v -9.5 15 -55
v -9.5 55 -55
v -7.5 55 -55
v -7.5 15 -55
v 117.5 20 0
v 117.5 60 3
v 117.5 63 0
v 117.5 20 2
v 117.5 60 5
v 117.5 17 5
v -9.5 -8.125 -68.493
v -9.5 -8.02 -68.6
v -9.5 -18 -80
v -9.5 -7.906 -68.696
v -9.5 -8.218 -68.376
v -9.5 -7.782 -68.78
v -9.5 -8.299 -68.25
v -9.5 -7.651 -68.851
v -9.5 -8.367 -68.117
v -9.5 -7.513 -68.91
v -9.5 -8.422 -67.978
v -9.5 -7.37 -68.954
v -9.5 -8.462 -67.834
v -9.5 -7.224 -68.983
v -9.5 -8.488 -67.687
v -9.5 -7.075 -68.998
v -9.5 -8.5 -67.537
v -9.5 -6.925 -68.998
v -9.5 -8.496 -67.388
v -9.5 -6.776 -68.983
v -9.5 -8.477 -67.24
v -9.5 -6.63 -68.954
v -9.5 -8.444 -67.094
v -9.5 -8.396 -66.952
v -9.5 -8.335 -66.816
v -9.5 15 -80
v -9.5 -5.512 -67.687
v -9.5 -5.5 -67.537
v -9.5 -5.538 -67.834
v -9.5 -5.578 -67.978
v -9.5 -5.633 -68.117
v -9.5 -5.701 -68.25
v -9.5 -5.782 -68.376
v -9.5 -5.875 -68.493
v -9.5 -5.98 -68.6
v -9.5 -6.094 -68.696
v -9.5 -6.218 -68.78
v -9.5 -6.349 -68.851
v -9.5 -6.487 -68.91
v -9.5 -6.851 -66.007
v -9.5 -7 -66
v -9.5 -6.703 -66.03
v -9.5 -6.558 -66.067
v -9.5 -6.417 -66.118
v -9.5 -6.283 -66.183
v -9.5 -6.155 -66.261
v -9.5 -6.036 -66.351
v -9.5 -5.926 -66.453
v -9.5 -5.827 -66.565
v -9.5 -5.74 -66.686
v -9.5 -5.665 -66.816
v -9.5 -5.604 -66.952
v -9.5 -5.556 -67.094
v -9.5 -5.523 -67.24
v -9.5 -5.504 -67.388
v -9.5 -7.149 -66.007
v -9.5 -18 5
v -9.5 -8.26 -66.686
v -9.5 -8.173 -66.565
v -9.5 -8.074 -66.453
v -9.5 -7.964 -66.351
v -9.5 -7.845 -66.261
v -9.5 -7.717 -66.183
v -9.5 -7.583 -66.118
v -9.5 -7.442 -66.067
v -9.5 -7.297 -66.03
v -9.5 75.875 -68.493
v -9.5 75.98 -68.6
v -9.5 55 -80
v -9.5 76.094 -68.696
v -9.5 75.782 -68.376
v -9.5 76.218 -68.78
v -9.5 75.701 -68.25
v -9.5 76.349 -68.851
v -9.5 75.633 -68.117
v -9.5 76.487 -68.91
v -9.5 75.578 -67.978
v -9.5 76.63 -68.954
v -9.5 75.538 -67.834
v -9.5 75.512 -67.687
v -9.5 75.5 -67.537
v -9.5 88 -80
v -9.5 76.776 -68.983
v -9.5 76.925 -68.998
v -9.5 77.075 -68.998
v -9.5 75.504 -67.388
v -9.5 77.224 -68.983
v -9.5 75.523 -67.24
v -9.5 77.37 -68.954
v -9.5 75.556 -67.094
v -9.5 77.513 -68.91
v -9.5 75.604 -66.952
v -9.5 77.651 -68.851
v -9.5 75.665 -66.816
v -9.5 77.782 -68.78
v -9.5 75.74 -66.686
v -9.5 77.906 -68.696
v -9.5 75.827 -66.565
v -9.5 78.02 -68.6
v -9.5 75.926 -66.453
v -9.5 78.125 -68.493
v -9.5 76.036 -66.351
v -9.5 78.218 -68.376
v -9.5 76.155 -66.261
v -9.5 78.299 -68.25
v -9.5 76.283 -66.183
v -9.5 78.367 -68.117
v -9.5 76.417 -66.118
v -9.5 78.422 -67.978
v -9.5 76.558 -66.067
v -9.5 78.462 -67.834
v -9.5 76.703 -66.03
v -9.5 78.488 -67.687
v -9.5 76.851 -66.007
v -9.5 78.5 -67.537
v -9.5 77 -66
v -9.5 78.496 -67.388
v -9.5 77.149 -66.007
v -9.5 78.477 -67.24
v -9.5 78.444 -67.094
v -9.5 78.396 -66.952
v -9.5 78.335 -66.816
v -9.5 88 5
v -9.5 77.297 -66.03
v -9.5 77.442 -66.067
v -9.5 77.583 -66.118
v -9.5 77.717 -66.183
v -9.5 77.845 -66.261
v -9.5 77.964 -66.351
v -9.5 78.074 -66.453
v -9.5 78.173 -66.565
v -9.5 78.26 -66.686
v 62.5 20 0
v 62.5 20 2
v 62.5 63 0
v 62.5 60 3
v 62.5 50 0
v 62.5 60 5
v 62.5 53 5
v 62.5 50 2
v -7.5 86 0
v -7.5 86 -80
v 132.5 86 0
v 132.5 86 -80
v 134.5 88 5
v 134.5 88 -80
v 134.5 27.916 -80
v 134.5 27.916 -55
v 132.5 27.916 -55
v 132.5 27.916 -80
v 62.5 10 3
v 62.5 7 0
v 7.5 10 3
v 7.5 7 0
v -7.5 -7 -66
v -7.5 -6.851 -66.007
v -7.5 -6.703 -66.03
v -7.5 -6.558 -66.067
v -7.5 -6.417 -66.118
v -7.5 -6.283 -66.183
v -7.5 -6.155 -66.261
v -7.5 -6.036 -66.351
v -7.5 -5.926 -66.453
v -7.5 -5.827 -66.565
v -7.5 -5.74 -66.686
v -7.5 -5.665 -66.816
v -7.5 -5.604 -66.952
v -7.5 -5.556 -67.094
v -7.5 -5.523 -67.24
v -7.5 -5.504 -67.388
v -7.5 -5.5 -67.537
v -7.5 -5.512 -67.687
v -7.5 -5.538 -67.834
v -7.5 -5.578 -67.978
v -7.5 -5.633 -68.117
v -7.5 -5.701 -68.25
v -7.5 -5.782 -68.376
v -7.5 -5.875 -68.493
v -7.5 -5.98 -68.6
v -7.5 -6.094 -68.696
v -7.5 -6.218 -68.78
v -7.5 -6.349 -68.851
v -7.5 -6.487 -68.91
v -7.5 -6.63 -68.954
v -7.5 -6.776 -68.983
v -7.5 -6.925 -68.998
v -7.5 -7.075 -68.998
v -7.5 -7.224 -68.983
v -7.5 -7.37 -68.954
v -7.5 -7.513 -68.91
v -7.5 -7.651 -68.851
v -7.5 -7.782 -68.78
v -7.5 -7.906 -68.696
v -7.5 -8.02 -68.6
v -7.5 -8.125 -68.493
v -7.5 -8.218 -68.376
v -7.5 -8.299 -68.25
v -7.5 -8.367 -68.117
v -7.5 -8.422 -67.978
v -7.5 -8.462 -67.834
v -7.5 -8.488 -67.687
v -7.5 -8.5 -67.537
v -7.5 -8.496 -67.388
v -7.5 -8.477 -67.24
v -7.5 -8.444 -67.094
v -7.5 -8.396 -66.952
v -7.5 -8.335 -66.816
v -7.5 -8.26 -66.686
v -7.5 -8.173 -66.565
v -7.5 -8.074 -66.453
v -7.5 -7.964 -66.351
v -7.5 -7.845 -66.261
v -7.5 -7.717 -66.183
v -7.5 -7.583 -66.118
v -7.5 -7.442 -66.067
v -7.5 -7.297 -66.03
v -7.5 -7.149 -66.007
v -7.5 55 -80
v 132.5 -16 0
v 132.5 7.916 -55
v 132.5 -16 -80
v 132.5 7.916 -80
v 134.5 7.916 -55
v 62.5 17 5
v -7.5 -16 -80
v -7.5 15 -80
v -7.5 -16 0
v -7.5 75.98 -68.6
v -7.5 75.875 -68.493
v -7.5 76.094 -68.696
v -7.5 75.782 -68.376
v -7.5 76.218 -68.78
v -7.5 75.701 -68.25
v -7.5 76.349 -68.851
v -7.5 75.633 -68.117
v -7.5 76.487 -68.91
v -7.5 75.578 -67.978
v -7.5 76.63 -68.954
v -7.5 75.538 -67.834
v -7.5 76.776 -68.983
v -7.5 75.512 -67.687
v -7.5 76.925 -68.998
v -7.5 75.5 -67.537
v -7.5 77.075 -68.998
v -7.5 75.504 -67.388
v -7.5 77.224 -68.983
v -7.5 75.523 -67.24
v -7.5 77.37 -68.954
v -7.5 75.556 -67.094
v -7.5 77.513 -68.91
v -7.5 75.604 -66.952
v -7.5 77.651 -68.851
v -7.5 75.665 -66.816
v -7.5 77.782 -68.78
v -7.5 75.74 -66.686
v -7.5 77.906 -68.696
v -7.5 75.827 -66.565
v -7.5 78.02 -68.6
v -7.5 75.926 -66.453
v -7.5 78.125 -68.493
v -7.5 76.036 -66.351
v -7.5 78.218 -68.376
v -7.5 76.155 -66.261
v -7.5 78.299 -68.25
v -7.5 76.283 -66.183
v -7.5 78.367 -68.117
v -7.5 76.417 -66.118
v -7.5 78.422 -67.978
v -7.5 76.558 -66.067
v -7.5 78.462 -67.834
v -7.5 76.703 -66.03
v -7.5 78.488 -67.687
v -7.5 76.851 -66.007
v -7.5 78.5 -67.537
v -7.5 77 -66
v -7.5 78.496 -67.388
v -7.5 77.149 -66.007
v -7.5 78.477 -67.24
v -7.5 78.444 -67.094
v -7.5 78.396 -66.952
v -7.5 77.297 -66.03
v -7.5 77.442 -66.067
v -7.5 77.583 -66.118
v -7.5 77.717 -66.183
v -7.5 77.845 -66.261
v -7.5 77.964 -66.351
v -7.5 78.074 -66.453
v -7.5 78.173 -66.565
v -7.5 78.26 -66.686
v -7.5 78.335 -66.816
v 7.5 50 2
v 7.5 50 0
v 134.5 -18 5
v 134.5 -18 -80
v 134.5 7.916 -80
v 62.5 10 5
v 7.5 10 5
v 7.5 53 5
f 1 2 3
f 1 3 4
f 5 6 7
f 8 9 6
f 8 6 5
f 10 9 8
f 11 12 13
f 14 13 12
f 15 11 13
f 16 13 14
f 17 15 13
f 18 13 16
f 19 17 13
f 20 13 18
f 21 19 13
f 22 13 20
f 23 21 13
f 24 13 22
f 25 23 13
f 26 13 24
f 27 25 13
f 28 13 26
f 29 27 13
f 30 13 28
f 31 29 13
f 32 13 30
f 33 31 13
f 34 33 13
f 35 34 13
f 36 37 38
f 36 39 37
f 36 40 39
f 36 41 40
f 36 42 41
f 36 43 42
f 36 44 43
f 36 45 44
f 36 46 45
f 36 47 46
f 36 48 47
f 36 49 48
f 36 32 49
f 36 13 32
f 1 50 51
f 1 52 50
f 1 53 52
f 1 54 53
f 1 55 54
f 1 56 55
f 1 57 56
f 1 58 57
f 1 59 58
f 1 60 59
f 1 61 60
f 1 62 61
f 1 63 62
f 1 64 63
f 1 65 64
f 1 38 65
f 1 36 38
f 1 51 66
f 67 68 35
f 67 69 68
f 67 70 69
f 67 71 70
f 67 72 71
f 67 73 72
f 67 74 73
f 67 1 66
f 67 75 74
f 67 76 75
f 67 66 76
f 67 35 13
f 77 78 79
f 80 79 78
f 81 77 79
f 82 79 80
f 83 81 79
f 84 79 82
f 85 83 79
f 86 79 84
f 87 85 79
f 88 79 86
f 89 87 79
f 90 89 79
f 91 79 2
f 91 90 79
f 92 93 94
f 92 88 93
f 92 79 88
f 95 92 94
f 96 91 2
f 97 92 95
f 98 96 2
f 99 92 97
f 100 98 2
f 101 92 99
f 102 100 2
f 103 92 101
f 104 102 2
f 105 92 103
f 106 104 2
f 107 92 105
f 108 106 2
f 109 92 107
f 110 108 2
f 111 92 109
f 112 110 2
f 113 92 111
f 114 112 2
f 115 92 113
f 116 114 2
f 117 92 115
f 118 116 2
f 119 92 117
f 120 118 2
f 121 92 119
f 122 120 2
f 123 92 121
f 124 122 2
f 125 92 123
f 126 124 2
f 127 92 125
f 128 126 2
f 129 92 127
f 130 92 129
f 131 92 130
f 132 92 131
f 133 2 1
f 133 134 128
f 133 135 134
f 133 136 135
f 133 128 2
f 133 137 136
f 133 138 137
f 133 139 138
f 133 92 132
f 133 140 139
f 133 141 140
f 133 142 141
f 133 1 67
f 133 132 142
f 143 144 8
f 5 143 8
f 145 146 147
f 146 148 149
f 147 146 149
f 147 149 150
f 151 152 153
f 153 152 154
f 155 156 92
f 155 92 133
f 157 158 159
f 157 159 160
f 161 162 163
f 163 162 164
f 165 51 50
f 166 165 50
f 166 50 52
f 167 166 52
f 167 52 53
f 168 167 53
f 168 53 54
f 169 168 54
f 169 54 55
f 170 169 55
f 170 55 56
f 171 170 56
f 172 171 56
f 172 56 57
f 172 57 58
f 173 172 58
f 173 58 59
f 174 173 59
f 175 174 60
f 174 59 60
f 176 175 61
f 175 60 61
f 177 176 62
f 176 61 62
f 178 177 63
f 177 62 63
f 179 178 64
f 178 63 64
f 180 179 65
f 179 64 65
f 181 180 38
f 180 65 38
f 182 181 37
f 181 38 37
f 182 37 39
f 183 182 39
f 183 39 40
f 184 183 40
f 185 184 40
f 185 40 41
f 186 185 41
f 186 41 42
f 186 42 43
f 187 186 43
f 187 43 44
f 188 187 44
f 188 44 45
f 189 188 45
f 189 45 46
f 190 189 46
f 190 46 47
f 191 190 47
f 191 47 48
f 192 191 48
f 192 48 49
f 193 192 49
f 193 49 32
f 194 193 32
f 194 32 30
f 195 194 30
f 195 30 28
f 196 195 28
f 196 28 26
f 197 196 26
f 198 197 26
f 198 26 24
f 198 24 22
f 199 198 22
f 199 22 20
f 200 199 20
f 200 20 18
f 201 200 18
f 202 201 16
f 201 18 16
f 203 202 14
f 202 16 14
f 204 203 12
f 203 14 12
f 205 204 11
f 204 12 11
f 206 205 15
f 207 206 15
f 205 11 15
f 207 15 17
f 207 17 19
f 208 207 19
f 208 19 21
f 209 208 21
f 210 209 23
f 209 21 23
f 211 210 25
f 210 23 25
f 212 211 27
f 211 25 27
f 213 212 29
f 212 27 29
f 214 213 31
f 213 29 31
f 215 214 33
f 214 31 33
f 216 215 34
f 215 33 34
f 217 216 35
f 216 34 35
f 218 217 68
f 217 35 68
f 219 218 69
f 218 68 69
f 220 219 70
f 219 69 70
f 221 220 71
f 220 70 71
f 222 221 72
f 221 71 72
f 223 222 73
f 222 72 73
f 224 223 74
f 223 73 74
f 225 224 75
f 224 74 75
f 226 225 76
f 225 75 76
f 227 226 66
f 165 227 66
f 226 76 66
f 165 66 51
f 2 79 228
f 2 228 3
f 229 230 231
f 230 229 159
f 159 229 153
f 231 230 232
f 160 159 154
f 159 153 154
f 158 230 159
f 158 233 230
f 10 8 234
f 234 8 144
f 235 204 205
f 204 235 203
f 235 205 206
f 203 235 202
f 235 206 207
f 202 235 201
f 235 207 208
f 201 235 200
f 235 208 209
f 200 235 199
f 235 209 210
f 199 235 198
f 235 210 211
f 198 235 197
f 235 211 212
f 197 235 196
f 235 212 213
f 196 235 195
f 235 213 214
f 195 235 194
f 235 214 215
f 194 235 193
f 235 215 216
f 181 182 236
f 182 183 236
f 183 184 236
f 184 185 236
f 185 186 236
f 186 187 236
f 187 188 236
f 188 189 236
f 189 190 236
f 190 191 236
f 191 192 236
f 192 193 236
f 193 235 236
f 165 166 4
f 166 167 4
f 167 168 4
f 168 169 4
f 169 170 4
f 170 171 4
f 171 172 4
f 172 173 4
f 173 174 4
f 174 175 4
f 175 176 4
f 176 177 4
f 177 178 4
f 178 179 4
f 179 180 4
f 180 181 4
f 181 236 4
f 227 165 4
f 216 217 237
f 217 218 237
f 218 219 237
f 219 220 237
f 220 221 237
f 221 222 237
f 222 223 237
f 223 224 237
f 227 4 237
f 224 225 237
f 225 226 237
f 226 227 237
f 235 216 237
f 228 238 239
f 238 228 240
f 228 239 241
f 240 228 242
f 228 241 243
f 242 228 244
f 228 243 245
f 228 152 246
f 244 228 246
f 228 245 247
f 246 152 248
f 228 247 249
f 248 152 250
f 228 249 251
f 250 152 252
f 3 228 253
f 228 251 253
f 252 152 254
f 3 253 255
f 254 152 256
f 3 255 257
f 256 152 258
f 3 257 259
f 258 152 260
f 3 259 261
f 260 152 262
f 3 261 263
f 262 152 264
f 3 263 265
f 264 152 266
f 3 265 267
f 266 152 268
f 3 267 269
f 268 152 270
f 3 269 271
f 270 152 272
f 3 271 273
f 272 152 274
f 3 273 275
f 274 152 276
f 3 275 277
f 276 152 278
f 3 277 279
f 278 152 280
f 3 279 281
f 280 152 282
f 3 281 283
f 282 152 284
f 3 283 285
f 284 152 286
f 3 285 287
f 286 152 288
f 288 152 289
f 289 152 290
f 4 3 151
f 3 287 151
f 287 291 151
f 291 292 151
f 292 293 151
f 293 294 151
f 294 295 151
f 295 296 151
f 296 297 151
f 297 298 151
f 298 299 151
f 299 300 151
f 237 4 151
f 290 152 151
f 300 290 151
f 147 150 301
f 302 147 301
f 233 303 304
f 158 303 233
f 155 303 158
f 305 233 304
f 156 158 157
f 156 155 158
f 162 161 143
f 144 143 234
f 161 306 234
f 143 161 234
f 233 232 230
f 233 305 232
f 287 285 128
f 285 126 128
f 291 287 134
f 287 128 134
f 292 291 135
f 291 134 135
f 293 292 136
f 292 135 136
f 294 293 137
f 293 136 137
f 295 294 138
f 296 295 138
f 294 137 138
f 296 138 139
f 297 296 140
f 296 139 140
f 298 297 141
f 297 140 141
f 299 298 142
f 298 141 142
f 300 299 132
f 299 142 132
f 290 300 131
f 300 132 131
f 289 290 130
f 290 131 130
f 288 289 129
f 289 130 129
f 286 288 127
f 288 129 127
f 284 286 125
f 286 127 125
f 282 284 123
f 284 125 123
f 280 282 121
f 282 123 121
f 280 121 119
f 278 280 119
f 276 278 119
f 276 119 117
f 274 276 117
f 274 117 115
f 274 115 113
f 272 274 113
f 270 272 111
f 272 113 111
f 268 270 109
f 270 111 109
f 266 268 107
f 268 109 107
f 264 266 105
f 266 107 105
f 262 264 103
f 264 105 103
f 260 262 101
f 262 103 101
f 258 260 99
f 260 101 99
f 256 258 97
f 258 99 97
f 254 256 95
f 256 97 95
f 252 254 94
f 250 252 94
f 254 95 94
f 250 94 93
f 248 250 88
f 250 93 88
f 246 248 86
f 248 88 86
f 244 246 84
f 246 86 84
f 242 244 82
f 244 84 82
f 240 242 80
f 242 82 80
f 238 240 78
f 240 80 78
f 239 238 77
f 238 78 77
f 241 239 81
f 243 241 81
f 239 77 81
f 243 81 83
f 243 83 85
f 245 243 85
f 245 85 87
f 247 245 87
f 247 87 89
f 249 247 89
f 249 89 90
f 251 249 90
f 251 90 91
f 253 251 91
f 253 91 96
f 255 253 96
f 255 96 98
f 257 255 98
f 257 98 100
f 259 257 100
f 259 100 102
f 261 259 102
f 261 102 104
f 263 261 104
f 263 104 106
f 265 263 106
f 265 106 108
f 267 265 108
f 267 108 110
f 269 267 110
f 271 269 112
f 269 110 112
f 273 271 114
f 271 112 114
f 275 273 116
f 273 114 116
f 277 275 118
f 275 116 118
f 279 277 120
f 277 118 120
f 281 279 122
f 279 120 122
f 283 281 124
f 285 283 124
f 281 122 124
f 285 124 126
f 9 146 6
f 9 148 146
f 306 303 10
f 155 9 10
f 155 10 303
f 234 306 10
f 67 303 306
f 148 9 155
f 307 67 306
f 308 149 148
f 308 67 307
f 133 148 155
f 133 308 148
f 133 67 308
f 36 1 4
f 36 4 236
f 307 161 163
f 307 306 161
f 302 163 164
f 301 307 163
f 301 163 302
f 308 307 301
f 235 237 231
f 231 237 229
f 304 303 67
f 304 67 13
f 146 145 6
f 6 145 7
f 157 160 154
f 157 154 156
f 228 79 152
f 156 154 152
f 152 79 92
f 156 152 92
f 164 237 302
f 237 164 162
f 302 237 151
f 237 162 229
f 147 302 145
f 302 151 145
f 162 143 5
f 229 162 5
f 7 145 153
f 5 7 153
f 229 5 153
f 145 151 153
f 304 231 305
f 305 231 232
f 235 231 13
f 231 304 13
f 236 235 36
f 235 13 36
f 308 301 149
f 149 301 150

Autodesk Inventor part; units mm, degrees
ref_plane "YZ Plane" through (0, 0, 0) normal (1, 0, 0) x (0, 1, 0)
ref_plane "XZ Plane" through (0, 0, 0) normal (0, 1, 0) x (-1, 0, 0)
ref_plane "XY Plane" through (0, 0, 0) normal (0, 0, 1) x (1, 0, 0)
sketch "Sketch1" plane through (0, 0, 0) normal (0, 0, 1) x (1, 0, 0)
  line L0 (0, 0) -> (0, 70) construction
  circle A0 centre (0, 0) radius 2.5
  circle A1 centre (0, 70) radius 2.5
  line L1 (0, 0) -> (125, 0) construction
  circle A2 centre (125, 0) radius 2.5
  circle A3 centre (125, 70) radius 2.5
  line L2 (-7.5, -16) -> (132.5, -16)
  line L3 (132.5, -16) -> (132.5, 86)
  line L4 (132.5, 86) -> (-7.5, 86)
  line L5 (-7.5, 86) -> (-7.5, -16)
  point P0 (62.5, 0)
  point P1 (62.5, -16)
  point P2 (0, 35)
  point P3 (-7.5, 35)
  dimension "d0" = 70
  dimension "d1" = 5
  dimension "d2" = 5
  dimension "d3" = 5
  dimension "d4" = 5
  dimension "d5" = 125
  dimension "d6" = 140
  dimension "d7" = 102
extrude "Extrusion1" add sketch "Sketch1" along normal blind 5
sketch "Sketch2" plane through (0, 0, 5) normal (0, 0, 1) x (1, 0, 0)
  line L0 (7.5, 60) -> (117.5, 60)
  line L1 (117.5, 60) -> (117.5, 10)
  line L2 (117.5, 10) -> (7.5, 10)
  line L3 (7.5, 10) -> (7.5, 60)
  line L4 (-7.5, 86) -> (-7.5, -16) projected
  line L5 (132.5, 86) -> (-7.5, 86) projected
  point P0 (0, 0)
  point P1 (62.5, 60)
  point P2 (62.5, 86)
  point P3 (7.5, 35)
  point P4 (-7.5, 35)
  dimension "d10" = 15
  dimension "d11" = 50
extrude "Extrusion2" cut sketch "Sketch2" against normal through all
sketch "Sketch3" plane through (-7.5, 86, 0) normal (0, 1, 0) x (1, 0, 0)
  line L0 (140, 0) -> (140, -5) projected
  line L1 (140, -5) -> (0, -5)
  line L2 (0, -5) -> (0, 80)
  line L3 (0, 80) -> (140, 80)
  line L4 (140, 80) -> (140, -5)
  point P0 (7.5, 0)
  dimension "d17" = 85
extrude "Extrusion3" add sketch "Sketch3" along normal blind 2
sketch "Sketch4" plane through (-7.5, -16, 0) normal (0, -1, 0) x (1, 0, 0)
  line L0 (140, 0) -> (0, 0) projected
  line L1 (0, 0) -> (0, -80) projected
  line L2 (0, -80) -> (140, -80) projected
  line L3 (140, -80) -> (140, 0) projected
  line L4 (0, 0) -> (140, 0) projected
  line L5 (140, 0) -> (140, 5) projected
  line L6 (0, 5) -> (140, 5) projected
  line L7 (0, 0) -> (0, 5) projected
  point P0 (7.5, 0)
extrude "Extrusion4" add sketch "Sketch4" along normal blind 2
sketch "Sketch5" plane through (-7.5, 86, -80) normal (-1, 0, 0) x (0, 0, 1)
  line L0 (85, -104) -> (85, 2) projected
  line L1 (0, -102) -> (0, -104) projected
  line L2 (85, 2) -> (0, 2)
  line L3 (0, 2) -> (0, -104)
  line L4 (0, -104) -> (85, -104)
  line L5 (85, -104) -> (85, 2)
  point P0 (80, -86)
extrude "Extrusion5" add sketch "Sketch5" along normal blind 2
sketch "Sketch6" plane through (132.5, 86, 0) normal (1, 0, 0) x (0, 0, -1)
  line L0 (-5, -104) -> (-5, 2) projected
  line L1 (-5, -104) -> (80, -104)
  line L2 (80, -104) -> (80, 2)
  line L3 (80, 2) -> (-5, 2)
  line L4 (-5, 2) -> (-5, -104)
  point P0 (0, -86)
extrude "Extrusion6" add sketch "Sketch6" along normal blind 2
sketch "Sketch7" plane through (0, 0, 5) normal (0, 0, 1) x (1, 0, 0)
  line L0 (117.5, 10) -> (7.5, 10) construction
  line L1 (7.5, 60) -> (117.5, 60) construction
  line L2 (7.5, 10) -> (7.5, 60) construction
  line L3 (117.5, 60) -> (117.5, 10) construction
  line L4 (7.5, 60) -> (62.5, 60)
  line L5 (62.5, 60) -> (62.5, 50)
  line L6 (62.5, 50) -> (7.5, 50)
  line L7 (7.5, 50) -> (7.5, 60)
  line L8 (117.5, 10) -> (62.5, 10)
  line L9 (62.5, 10) -> (62.5, 20)
  line L10 (62.5, 20) -> (117.5, 20)
  line L11 (117.5, 20) -> (117.5, 10)
  line L12 (117.5, 10) -> (7.5, 10) projected
  line L13 (7.5, 60) -> (117.5, 60) projected
  line L14 (7.5, 10) -> (7.5, 60) projected
  point P0 (0, 0)
  point P1 (62.5, 10)
  point P2 (7.5, 35)
  dimension "d26" = 55
  dimension "d27" = 10
  dimension "d28" = 55
  dimension "d29" = 10
extrude "Extrusion7" add sketch "Sketch7" against normal blind 5
chamfer "Chamfer2" distance 3 angle 45 4 edges at (35, 10, 0) (90, 60, 0) (90, 20, 5) (35, 50, 5)
sketch "Sketch8" plane through (134.5, 86, 0) normal (1, 0, 0) x (0, 0, -1)
  line L0 (80, -104) -> (80, 2) projected
  line L1 (80, -102) -> (80, 0) projected
  line L2 (80, -51) -> (93.9386, -51)
  line L3 (80, -78.0836) -> (55, -78.0836)
  line L4 (55, -78.0836) -> (55, -58.0836)
  line L5 (55, -58.0836) -> (80, -58.0836)
  line L6 (80, -58.0836) -> (80, -78.0836)
  point P0 (0, -86)
  dimension "d36" = 20
  dimension "d37" = 25
  dimension "d40" = 7.0836
extrude "Extrusion8" cut sketch "Sketch8" against normal blind 10
sketch "Sketch9" plane through (-9.5, 86, -80) normal (-1, 0, 0) x (0, 0, 1)
  line L0 (0, -58.0836) -> (0, 0) projected
  line L1 (0, -31) -> (25, -31)
  line L2 (25, -31) -> (25, -71)
  line L3 (25, -71) -> (0, -71)
  line L4 (0, -71) -> (0, -31)
  line L5 (0, 2) -> (0, -104) projected
  line L6 (0, -71) -> (25, -71)
  line L7 (25, -71) -> (25, -31)
  line L8 (25, -31) -> (0, -31)
  line L9 (0, -31) -> (0, -71)
  point P0 (80, -86)
  point P1 (0, -51)
  dimension "d41" = 40
  dimension "d42" = 25
extrude "Extrusion9" cut sketch "Sketch9" against normal blind 10
sketch "Sketch10" plane through (-9.5, 86, -80) normal (-1, 0, 0) x (0, 0, 1)
  circle A0 centre (12.5, -93) radius 1.5
  circle A1 centre (12.5, -9) radius 1.5
  line L0 (12.5, -93) -> (12.5, -9) construction
  line L1 (85, -104) -> (85, 2) projected
  line L2 (25, -71) -> (0, -71) projected
  point P0 (80, -86)
  point P1 (85, -51)
  point P2 (12.5, -51)
  point P3 (12.5, -71)
  point P4 (12.5, -71)
  dimension "d45" = 3
  dimension "d46" = 3
  dimension "d47" = 84
extrude "Extrusion10" cut sketch "Sketch10" against normal blind 10
sketch "Sketch11" plane through (0, 0, 5) normal (0, 0, 1) x (1, 0, 0)
  circle A0 centre (0, 0) radius 2.5 projected
  circle A1 centre (0, 70) radius 2.5 projected
  circle A2 centre (125, 0) radius 2.5 projected
  circle A3 centre (125, 70) radius 2.5 projected
extrude "Extrusion11" add sketch "Sketch11" against normal blind 5
properties part number "GA06" material "ABS Plastic"
